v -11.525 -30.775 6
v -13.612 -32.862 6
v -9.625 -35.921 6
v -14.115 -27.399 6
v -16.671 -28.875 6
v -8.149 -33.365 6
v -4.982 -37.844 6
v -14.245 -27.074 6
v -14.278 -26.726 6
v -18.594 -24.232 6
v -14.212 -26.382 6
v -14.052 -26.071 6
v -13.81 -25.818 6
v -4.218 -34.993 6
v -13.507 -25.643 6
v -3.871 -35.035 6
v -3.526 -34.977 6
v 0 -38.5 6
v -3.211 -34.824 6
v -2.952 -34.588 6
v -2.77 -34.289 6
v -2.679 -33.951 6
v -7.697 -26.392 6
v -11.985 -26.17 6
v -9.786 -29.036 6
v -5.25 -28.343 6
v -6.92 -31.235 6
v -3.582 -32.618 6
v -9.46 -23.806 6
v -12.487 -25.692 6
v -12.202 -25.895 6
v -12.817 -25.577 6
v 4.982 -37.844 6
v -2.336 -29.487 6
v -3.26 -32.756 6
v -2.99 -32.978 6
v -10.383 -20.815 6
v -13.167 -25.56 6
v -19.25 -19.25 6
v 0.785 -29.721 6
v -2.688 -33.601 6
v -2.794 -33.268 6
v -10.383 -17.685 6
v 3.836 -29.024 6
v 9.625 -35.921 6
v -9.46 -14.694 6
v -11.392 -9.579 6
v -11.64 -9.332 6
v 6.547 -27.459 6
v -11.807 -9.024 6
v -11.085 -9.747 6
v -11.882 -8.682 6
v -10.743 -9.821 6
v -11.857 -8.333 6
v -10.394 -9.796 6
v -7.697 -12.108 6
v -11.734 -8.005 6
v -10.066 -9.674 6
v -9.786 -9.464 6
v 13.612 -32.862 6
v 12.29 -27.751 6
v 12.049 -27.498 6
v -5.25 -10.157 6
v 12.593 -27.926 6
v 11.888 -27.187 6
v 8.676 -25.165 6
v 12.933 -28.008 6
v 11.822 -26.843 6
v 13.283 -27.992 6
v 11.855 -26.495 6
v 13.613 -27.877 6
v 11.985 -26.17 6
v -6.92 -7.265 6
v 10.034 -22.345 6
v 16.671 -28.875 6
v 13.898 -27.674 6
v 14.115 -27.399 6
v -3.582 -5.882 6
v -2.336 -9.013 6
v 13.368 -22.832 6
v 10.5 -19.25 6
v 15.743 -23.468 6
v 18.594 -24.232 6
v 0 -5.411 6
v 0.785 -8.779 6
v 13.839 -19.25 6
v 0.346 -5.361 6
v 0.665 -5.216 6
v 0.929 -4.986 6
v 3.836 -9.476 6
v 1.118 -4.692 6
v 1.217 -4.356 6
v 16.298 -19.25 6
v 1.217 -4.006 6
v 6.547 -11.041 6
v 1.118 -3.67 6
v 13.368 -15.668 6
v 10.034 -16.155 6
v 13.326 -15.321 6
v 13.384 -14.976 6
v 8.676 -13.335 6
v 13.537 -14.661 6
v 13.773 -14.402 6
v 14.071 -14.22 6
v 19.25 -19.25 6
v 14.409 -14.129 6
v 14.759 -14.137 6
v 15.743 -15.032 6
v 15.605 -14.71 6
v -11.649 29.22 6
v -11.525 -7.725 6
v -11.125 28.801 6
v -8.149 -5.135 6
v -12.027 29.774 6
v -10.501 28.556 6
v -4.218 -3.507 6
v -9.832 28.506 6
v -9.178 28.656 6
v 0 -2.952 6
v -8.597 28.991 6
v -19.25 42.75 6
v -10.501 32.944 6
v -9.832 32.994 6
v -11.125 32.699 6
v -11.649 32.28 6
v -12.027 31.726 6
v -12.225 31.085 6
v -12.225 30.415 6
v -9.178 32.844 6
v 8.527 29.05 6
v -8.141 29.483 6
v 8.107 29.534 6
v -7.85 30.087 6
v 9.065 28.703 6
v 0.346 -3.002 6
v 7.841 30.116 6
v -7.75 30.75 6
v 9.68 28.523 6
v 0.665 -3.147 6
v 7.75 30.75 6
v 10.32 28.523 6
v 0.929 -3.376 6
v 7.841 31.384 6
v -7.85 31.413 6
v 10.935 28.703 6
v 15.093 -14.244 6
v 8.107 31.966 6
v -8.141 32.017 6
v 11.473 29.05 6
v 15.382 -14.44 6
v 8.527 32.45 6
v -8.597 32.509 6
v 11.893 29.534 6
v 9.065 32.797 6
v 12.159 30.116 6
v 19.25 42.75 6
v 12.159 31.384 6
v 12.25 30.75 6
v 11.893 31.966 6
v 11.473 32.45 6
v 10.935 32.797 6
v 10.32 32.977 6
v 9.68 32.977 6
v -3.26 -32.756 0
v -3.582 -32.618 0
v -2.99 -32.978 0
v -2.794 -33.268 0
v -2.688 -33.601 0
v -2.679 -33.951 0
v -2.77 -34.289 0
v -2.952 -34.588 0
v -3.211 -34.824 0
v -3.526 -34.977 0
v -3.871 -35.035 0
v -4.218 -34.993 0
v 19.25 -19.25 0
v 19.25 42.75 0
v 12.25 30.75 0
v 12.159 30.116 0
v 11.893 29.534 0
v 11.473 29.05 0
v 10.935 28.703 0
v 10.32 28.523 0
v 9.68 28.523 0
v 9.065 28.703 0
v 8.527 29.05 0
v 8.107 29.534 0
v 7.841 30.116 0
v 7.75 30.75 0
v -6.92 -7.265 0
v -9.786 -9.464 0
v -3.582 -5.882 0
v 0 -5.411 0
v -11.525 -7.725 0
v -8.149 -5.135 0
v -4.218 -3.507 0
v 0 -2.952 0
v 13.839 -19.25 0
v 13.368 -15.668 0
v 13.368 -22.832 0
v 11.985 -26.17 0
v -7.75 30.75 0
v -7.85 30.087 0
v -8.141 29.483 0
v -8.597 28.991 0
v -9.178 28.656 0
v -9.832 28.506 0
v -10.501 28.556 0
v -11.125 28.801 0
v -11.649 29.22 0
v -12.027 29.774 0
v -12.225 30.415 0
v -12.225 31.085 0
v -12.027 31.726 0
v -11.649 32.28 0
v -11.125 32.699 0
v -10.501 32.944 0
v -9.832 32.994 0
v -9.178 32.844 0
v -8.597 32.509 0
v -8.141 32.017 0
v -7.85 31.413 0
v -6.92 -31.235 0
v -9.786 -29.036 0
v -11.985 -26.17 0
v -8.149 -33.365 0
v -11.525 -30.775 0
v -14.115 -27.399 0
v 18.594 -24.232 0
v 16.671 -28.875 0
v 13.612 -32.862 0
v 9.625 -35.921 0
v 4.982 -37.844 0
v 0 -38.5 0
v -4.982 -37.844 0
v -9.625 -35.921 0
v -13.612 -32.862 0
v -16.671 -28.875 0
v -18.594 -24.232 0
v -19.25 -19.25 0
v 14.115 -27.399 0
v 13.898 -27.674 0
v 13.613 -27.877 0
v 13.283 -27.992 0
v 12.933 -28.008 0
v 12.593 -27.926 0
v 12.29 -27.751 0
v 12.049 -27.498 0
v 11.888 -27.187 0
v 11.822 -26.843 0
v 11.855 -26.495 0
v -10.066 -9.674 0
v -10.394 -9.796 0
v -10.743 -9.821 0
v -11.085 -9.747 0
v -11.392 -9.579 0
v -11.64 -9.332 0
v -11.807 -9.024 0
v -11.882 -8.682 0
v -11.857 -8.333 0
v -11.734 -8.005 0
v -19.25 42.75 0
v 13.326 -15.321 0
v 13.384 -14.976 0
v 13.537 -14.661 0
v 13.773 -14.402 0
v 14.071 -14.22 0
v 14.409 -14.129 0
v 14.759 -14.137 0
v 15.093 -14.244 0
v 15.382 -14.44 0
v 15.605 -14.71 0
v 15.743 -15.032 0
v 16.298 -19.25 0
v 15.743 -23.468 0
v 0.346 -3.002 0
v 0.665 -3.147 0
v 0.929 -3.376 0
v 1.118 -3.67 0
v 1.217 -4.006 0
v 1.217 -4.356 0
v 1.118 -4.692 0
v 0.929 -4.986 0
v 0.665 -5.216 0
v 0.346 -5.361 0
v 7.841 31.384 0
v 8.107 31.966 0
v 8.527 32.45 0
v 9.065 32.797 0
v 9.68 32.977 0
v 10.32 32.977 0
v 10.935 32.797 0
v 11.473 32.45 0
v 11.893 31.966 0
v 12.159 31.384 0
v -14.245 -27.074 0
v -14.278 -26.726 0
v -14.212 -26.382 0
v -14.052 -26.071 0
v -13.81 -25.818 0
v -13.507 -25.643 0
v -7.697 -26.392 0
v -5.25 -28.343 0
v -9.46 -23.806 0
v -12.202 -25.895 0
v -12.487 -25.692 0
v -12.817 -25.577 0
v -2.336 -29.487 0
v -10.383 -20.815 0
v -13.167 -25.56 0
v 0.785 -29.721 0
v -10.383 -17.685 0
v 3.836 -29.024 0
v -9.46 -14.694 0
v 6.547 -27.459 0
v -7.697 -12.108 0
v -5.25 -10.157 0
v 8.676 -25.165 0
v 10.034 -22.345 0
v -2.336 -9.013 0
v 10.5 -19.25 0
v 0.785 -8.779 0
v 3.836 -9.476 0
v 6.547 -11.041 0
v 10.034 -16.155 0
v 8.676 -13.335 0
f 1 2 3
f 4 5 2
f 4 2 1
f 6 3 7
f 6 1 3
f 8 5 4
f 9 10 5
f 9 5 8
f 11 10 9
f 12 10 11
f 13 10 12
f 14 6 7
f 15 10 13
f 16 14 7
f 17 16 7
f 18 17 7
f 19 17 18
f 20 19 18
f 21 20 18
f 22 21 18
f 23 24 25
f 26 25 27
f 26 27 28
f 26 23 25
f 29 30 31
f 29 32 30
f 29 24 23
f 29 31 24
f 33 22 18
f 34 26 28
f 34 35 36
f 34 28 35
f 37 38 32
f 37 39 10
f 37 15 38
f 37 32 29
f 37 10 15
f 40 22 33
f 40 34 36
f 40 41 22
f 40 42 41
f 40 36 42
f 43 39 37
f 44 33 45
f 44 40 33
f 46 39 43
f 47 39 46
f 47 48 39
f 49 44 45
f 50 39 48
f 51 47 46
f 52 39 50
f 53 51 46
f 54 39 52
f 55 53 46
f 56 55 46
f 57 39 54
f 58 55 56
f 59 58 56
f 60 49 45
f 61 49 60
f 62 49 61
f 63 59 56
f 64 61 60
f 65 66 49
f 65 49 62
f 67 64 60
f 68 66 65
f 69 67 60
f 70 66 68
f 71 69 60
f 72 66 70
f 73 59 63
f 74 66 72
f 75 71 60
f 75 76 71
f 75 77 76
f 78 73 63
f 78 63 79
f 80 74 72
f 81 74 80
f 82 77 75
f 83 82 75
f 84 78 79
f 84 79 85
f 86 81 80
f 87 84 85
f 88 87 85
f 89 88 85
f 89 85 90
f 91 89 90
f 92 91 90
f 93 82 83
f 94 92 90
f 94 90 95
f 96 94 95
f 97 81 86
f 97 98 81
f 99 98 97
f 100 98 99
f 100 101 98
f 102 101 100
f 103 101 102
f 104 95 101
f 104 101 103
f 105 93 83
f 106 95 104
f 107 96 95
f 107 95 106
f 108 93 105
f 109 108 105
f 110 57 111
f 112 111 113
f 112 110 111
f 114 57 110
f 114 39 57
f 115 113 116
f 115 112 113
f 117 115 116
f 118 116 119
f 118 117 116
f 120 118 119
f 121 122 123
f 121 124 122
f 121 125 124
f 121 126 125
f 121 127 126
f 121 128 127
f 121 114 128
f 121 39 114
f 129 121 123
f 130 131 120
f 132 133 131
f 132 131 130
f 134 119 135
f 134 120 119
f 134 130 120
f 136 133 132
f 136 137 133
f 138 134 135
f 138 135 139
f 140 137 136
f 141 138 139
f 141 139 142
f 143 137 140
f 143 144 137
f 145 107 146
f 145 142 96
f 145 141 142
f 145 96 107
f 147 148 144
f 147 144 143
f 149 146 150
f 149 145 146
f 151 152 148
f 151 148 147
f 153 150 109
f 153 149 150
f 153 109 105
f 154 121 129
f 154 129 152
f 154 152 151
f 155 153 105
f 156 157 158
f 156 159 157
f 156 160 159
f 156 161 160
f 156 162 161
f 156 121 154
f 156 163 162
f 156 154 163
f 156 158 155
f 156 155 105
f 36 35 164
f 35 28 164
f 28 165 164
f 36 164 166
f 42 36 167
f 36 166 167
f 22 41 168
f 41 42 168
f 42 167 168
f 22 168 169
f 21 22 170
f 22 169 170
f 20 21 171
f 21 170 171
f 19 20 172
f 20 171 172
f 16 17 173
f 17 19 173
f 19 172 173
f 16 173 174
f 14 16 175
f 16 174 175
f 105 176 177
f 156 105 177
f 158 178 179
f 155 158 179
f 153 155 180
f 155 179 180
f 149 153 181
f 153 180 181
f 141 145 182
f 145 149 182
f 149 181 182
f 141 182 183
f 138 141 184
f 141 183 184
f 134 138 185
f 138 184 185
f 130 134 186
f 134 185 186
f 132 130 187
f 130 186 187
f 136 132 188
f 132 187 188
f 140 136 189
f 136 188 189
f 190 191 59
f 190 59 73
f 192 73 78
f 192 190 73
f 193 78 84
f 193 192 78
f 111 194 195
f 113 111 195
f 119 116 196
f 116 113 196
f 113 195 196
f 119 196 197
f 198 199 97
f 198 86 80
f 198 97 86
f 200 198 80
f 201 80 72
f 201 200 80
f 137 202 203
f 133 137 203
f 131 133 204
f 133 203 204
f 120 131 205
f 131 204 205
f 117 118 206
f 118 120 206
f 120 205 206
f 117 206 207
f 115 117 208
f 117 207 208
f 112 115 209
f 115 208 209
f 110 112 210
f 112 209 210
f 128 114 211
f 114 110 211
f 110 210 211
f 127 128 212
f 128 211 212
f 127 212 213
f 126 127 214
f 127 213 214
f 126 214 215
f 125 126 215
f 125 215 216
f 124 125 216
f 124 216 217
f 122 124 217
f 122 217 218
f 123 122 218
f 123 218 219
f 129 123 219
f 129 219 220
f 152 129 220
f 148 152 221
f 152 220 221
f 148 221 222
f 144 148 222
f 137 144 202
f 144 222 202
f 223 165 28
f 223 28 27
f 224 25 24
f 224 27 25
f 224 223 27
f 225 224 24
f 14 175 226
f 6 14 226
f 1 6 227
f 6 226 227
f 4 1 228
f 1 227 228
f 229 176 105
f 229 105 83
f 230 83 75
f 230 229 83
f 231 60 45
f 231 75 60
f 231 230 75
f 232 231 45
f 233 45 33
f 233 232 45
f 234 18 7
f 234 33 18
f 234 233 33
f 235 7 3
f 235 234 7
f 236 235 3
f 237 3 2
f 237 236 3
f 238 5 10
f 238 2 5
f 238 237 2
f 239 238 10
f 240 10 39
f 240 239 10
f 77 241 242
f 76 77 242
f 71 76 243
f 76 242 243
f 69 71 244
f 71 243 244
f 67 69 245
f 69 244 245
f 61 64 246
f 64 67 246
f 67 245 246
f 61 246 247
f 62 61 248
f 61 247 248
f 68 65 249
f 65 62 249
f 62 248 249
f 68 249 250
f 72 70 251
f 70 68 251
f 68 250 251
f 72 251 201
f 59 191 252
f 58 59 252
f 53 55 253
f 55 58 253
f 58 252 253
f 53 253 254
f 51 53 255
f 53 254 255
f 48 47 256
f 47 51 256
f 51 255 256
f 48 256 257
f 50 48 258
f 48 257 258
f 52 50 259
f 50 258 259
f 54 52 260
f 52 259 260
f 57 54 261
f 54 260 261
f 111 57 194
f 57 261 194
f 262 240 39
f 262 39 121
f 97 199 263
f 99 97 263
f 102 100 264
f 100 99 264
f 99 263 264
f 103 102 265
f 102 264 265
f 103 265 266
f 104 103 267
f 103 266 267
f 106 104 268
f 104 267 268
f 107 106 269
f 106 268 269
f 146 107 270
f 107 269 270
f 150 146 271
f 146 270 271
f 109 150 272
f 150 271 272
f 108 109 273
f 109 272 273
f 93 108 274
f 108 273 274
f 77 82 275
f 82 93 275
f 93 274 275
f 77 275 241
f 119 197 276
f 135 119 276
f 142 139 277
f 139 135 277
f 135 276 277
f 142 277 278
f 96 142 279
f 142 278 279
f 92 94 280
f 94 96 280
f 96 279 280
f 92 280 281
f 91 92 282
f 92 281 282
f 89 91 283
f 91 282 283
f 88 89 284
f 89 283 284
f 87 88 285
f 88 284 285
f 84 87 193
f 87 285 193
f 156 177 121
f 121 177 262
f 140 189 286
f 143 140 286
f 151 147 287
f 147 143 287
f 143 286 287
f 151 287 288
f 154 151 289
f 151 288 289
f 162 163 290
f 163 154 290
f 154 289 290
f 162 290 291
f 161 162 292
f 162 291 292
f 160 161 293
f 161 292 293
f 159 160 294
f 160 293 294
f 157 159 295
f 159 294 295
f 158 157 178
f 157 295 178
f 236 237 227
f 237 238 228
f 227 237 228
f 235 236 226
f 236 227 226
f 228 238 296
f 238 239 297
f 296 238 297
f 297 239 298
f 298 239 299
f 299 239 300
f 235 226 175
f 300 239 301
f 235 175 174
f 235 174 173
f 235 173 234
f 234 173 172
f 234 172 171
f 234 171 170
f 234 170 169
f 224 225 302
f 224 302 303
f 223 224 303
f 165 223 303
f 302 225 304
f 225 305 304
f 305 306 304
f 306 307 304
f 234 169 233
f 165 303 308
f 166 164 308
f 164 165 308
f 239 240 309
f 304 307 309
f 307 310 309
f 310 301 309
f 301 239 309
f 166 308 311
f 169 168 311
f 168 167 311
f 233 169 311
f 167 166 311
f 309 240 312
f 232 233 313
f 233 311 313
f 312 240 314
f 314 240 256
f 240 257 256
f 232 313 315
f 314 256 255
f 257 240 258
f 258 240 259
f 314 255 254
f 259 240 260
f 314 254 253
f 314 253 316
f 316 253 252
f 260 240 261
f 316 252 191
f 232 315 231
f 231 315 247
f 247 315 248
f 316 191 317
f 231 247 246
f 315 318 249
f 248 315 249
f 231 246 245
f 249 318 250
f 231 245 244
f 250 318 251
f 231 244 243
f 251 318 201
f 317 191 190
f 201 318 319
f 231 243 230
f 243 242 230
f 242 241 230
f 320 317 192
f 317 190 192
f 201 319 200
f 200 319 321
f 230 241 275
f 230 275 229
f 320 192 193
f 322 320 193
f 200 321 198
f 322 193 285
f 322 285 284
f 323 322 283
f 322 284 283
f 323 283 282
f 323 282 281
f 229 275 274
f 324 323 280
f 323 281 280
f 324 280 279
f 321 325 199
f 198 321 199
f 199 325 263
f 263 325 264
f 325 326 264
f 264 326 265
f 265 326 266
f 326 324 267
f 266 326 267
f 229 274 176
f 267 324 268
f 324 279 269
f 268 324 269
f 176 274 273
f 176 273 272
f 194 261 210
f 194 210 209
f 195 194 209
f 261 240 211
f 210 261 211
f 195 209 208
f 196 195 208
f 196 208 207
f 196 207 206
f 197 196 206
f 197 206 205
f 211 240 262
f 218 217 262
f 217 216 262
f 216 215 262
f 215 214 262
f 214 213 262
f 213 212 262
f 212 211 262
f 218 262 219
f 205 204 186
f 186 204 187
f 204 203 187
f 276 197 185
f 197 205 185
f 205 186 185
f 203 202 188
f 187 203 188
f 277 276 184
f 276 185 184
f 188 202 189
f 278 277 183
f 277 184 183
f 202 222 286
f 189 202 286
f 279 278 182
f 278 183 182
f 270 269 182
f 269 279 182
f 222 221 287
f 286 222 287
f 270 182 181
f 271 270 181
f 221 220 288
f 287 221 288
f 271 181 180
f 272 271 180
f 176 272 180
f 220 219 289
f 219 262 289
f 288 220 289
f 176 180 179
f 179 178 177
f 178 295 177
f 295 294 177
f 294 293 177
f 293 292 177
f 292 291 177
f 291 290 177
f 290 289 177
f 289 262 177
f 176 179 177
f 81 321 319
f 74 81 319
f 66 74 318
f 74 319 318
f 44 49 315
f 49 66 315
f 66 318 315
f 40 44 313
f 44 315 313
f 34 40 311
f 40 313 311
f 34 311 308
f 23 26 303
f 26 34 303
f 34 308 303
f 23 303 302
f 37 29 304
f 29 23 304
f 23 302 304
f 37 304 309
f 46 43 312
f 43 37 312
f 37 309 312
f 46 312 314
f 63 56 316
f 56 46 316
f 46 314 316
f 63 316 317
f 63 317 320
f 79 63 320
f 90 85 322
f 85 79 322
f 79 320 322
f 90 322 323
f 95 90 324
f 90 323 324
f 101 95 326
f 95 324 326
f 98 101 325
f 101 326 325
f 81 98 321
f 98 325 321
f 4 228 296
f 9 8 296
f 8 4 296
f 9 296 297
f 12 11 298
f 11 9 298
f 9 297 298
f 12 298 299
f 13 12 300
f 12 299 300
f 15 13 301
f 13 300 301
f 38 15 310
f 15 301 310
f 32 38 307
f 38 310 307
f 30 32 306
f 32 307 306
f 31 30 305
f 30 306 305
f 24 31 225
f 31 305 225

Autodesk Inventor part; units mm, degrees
ref_plane "YZ Plane" through (0, 0, 0) normal (1, 0, 0) x (0, 1, 0)
ref_plane "XZ Plane" through (0, 0, 0) normal (0, 1, 0) x (-1, 0, 0)
ref_plane "XY Plane" through (0, 0, 0) normal (0, 0, 1) x (1, 0, 0)
sketch "Sketch1" plane through (0, 0, 0) normal (0, 0, 1) x (1, 0, 0)
  arc A0 (-19.25, -19.25) -> (19.25, -19.25) centre (0, -19.25) ccw
  circle A1 centre (0, -19.25) radius 10.5
  arc A2 (11.9852, -26.1697) -> (14.1148, -27.3992) centre (13.05, -26.7844) ccw
  arc A3 (-11.9852, -26.1697) -> (-14.1148, -27.3992) centre (-13.05, -26.7844) ccw
  arc A4 (0, -5.4107) -> (0, -2.9517) centre (0, -4.1812) ccw
  line L0 (0, -19.25) -> (14.5554, -15.3499) construction
  line L1 (0, -19.25) -> (13.05, -26.7844) construction
  line L2 (0, -19.25) -> (-10.6553, -8.5947) construction
  line L3 (0, -19.25) -> (0, -4.1812) construction
  line L4 (0, -19.25) -> (-3.9001, -33.8054) construction
  line L5 (0, -19.25) -> (-13.05, -26.7844) construction
  arc A5 (-4.2183, -34.993) -> (-3.5819, -32.6178) centre (-3.9001, -33.8054) ccw
  arc A6 (15.743, -15.0317) -> (13.3678, -15.6681) centre (14.5554, -15.3499) ccw
  arc A7 (-11.5247, -7.7253) -> (-9.7859, -9.4641) centre (-10.6553, -8.5947) ccw
  arc A8 (0, -2.9517) -> (-11.5247, -7.7253) centre (0, -19.25) ccw
  arc A9 (0, -5.4107) -> (-9.7859, -9.4641) centre (0, -19.25) ccw
  arc A10 (11.9852, -26.1697) -> (13.3678, -15.6681) centre (0, -19.25) ccw
  arc A11 (14.1148, -27.3992) -> (15.743, -15.0317) centre (0, -19.25) ccw
  arc A12 (-11.9852, -26.1697) -> (-3.5819, -32.6178) centre (0, -19.25) ccw
  arc A13 (-14.1148, -27.3992) -> (-4.2183, -34.993) centre (0, -19.25) ccw
  line L6 (19.25, -19.25) -> (19.25, 42.75)
  line L7 (-19.25, -19.25) -> (-19.25, 42.75)
  line L8 (19.25, 42.75) -> (-19.25, 42.75)
  circle A14 centre (-10, 30.75) radius 2.25
  circle A15 centre (10, 30.75) radius 2.25
  line L9 (10, 30.75) -> (-10, 30.75)
  point P0 (0, 0)
  point P1 (19.25, 30.75)
  dimension "d0" = 21
  dimension "d1" = 45
  dimension "d2" = 45
  dimension "d3" = 45
  dimension "d4" = 2.459
  dimension "d5" = 2.459
  dimension "d6" = 2.459
  dimension "d7" = 2.459
  dimension "d8" = 2.459
  dimension "d9" = 2.459
  dimension "d11" = 62
  dimension "d14" = 19.25
  dimension "d21" = 4.5
  dimension "d22" = 12
  dimension "d23" = 4.5
  dimension "d24" = 20
  dimension "d25" = 9.25
  dimension "d26" = 38.5
extrude "Extrusion1" add sketch "Sketch1" along normal blind 6
equation "\"d8\" = d6"
equation "\"d9\" = d7"
equation "\"d23\" = d21"
equation "\"d25\" = -0.5 * d24 + 0.5 * d26"
properties part number "Joint1C_1" material "PET Plastic"
